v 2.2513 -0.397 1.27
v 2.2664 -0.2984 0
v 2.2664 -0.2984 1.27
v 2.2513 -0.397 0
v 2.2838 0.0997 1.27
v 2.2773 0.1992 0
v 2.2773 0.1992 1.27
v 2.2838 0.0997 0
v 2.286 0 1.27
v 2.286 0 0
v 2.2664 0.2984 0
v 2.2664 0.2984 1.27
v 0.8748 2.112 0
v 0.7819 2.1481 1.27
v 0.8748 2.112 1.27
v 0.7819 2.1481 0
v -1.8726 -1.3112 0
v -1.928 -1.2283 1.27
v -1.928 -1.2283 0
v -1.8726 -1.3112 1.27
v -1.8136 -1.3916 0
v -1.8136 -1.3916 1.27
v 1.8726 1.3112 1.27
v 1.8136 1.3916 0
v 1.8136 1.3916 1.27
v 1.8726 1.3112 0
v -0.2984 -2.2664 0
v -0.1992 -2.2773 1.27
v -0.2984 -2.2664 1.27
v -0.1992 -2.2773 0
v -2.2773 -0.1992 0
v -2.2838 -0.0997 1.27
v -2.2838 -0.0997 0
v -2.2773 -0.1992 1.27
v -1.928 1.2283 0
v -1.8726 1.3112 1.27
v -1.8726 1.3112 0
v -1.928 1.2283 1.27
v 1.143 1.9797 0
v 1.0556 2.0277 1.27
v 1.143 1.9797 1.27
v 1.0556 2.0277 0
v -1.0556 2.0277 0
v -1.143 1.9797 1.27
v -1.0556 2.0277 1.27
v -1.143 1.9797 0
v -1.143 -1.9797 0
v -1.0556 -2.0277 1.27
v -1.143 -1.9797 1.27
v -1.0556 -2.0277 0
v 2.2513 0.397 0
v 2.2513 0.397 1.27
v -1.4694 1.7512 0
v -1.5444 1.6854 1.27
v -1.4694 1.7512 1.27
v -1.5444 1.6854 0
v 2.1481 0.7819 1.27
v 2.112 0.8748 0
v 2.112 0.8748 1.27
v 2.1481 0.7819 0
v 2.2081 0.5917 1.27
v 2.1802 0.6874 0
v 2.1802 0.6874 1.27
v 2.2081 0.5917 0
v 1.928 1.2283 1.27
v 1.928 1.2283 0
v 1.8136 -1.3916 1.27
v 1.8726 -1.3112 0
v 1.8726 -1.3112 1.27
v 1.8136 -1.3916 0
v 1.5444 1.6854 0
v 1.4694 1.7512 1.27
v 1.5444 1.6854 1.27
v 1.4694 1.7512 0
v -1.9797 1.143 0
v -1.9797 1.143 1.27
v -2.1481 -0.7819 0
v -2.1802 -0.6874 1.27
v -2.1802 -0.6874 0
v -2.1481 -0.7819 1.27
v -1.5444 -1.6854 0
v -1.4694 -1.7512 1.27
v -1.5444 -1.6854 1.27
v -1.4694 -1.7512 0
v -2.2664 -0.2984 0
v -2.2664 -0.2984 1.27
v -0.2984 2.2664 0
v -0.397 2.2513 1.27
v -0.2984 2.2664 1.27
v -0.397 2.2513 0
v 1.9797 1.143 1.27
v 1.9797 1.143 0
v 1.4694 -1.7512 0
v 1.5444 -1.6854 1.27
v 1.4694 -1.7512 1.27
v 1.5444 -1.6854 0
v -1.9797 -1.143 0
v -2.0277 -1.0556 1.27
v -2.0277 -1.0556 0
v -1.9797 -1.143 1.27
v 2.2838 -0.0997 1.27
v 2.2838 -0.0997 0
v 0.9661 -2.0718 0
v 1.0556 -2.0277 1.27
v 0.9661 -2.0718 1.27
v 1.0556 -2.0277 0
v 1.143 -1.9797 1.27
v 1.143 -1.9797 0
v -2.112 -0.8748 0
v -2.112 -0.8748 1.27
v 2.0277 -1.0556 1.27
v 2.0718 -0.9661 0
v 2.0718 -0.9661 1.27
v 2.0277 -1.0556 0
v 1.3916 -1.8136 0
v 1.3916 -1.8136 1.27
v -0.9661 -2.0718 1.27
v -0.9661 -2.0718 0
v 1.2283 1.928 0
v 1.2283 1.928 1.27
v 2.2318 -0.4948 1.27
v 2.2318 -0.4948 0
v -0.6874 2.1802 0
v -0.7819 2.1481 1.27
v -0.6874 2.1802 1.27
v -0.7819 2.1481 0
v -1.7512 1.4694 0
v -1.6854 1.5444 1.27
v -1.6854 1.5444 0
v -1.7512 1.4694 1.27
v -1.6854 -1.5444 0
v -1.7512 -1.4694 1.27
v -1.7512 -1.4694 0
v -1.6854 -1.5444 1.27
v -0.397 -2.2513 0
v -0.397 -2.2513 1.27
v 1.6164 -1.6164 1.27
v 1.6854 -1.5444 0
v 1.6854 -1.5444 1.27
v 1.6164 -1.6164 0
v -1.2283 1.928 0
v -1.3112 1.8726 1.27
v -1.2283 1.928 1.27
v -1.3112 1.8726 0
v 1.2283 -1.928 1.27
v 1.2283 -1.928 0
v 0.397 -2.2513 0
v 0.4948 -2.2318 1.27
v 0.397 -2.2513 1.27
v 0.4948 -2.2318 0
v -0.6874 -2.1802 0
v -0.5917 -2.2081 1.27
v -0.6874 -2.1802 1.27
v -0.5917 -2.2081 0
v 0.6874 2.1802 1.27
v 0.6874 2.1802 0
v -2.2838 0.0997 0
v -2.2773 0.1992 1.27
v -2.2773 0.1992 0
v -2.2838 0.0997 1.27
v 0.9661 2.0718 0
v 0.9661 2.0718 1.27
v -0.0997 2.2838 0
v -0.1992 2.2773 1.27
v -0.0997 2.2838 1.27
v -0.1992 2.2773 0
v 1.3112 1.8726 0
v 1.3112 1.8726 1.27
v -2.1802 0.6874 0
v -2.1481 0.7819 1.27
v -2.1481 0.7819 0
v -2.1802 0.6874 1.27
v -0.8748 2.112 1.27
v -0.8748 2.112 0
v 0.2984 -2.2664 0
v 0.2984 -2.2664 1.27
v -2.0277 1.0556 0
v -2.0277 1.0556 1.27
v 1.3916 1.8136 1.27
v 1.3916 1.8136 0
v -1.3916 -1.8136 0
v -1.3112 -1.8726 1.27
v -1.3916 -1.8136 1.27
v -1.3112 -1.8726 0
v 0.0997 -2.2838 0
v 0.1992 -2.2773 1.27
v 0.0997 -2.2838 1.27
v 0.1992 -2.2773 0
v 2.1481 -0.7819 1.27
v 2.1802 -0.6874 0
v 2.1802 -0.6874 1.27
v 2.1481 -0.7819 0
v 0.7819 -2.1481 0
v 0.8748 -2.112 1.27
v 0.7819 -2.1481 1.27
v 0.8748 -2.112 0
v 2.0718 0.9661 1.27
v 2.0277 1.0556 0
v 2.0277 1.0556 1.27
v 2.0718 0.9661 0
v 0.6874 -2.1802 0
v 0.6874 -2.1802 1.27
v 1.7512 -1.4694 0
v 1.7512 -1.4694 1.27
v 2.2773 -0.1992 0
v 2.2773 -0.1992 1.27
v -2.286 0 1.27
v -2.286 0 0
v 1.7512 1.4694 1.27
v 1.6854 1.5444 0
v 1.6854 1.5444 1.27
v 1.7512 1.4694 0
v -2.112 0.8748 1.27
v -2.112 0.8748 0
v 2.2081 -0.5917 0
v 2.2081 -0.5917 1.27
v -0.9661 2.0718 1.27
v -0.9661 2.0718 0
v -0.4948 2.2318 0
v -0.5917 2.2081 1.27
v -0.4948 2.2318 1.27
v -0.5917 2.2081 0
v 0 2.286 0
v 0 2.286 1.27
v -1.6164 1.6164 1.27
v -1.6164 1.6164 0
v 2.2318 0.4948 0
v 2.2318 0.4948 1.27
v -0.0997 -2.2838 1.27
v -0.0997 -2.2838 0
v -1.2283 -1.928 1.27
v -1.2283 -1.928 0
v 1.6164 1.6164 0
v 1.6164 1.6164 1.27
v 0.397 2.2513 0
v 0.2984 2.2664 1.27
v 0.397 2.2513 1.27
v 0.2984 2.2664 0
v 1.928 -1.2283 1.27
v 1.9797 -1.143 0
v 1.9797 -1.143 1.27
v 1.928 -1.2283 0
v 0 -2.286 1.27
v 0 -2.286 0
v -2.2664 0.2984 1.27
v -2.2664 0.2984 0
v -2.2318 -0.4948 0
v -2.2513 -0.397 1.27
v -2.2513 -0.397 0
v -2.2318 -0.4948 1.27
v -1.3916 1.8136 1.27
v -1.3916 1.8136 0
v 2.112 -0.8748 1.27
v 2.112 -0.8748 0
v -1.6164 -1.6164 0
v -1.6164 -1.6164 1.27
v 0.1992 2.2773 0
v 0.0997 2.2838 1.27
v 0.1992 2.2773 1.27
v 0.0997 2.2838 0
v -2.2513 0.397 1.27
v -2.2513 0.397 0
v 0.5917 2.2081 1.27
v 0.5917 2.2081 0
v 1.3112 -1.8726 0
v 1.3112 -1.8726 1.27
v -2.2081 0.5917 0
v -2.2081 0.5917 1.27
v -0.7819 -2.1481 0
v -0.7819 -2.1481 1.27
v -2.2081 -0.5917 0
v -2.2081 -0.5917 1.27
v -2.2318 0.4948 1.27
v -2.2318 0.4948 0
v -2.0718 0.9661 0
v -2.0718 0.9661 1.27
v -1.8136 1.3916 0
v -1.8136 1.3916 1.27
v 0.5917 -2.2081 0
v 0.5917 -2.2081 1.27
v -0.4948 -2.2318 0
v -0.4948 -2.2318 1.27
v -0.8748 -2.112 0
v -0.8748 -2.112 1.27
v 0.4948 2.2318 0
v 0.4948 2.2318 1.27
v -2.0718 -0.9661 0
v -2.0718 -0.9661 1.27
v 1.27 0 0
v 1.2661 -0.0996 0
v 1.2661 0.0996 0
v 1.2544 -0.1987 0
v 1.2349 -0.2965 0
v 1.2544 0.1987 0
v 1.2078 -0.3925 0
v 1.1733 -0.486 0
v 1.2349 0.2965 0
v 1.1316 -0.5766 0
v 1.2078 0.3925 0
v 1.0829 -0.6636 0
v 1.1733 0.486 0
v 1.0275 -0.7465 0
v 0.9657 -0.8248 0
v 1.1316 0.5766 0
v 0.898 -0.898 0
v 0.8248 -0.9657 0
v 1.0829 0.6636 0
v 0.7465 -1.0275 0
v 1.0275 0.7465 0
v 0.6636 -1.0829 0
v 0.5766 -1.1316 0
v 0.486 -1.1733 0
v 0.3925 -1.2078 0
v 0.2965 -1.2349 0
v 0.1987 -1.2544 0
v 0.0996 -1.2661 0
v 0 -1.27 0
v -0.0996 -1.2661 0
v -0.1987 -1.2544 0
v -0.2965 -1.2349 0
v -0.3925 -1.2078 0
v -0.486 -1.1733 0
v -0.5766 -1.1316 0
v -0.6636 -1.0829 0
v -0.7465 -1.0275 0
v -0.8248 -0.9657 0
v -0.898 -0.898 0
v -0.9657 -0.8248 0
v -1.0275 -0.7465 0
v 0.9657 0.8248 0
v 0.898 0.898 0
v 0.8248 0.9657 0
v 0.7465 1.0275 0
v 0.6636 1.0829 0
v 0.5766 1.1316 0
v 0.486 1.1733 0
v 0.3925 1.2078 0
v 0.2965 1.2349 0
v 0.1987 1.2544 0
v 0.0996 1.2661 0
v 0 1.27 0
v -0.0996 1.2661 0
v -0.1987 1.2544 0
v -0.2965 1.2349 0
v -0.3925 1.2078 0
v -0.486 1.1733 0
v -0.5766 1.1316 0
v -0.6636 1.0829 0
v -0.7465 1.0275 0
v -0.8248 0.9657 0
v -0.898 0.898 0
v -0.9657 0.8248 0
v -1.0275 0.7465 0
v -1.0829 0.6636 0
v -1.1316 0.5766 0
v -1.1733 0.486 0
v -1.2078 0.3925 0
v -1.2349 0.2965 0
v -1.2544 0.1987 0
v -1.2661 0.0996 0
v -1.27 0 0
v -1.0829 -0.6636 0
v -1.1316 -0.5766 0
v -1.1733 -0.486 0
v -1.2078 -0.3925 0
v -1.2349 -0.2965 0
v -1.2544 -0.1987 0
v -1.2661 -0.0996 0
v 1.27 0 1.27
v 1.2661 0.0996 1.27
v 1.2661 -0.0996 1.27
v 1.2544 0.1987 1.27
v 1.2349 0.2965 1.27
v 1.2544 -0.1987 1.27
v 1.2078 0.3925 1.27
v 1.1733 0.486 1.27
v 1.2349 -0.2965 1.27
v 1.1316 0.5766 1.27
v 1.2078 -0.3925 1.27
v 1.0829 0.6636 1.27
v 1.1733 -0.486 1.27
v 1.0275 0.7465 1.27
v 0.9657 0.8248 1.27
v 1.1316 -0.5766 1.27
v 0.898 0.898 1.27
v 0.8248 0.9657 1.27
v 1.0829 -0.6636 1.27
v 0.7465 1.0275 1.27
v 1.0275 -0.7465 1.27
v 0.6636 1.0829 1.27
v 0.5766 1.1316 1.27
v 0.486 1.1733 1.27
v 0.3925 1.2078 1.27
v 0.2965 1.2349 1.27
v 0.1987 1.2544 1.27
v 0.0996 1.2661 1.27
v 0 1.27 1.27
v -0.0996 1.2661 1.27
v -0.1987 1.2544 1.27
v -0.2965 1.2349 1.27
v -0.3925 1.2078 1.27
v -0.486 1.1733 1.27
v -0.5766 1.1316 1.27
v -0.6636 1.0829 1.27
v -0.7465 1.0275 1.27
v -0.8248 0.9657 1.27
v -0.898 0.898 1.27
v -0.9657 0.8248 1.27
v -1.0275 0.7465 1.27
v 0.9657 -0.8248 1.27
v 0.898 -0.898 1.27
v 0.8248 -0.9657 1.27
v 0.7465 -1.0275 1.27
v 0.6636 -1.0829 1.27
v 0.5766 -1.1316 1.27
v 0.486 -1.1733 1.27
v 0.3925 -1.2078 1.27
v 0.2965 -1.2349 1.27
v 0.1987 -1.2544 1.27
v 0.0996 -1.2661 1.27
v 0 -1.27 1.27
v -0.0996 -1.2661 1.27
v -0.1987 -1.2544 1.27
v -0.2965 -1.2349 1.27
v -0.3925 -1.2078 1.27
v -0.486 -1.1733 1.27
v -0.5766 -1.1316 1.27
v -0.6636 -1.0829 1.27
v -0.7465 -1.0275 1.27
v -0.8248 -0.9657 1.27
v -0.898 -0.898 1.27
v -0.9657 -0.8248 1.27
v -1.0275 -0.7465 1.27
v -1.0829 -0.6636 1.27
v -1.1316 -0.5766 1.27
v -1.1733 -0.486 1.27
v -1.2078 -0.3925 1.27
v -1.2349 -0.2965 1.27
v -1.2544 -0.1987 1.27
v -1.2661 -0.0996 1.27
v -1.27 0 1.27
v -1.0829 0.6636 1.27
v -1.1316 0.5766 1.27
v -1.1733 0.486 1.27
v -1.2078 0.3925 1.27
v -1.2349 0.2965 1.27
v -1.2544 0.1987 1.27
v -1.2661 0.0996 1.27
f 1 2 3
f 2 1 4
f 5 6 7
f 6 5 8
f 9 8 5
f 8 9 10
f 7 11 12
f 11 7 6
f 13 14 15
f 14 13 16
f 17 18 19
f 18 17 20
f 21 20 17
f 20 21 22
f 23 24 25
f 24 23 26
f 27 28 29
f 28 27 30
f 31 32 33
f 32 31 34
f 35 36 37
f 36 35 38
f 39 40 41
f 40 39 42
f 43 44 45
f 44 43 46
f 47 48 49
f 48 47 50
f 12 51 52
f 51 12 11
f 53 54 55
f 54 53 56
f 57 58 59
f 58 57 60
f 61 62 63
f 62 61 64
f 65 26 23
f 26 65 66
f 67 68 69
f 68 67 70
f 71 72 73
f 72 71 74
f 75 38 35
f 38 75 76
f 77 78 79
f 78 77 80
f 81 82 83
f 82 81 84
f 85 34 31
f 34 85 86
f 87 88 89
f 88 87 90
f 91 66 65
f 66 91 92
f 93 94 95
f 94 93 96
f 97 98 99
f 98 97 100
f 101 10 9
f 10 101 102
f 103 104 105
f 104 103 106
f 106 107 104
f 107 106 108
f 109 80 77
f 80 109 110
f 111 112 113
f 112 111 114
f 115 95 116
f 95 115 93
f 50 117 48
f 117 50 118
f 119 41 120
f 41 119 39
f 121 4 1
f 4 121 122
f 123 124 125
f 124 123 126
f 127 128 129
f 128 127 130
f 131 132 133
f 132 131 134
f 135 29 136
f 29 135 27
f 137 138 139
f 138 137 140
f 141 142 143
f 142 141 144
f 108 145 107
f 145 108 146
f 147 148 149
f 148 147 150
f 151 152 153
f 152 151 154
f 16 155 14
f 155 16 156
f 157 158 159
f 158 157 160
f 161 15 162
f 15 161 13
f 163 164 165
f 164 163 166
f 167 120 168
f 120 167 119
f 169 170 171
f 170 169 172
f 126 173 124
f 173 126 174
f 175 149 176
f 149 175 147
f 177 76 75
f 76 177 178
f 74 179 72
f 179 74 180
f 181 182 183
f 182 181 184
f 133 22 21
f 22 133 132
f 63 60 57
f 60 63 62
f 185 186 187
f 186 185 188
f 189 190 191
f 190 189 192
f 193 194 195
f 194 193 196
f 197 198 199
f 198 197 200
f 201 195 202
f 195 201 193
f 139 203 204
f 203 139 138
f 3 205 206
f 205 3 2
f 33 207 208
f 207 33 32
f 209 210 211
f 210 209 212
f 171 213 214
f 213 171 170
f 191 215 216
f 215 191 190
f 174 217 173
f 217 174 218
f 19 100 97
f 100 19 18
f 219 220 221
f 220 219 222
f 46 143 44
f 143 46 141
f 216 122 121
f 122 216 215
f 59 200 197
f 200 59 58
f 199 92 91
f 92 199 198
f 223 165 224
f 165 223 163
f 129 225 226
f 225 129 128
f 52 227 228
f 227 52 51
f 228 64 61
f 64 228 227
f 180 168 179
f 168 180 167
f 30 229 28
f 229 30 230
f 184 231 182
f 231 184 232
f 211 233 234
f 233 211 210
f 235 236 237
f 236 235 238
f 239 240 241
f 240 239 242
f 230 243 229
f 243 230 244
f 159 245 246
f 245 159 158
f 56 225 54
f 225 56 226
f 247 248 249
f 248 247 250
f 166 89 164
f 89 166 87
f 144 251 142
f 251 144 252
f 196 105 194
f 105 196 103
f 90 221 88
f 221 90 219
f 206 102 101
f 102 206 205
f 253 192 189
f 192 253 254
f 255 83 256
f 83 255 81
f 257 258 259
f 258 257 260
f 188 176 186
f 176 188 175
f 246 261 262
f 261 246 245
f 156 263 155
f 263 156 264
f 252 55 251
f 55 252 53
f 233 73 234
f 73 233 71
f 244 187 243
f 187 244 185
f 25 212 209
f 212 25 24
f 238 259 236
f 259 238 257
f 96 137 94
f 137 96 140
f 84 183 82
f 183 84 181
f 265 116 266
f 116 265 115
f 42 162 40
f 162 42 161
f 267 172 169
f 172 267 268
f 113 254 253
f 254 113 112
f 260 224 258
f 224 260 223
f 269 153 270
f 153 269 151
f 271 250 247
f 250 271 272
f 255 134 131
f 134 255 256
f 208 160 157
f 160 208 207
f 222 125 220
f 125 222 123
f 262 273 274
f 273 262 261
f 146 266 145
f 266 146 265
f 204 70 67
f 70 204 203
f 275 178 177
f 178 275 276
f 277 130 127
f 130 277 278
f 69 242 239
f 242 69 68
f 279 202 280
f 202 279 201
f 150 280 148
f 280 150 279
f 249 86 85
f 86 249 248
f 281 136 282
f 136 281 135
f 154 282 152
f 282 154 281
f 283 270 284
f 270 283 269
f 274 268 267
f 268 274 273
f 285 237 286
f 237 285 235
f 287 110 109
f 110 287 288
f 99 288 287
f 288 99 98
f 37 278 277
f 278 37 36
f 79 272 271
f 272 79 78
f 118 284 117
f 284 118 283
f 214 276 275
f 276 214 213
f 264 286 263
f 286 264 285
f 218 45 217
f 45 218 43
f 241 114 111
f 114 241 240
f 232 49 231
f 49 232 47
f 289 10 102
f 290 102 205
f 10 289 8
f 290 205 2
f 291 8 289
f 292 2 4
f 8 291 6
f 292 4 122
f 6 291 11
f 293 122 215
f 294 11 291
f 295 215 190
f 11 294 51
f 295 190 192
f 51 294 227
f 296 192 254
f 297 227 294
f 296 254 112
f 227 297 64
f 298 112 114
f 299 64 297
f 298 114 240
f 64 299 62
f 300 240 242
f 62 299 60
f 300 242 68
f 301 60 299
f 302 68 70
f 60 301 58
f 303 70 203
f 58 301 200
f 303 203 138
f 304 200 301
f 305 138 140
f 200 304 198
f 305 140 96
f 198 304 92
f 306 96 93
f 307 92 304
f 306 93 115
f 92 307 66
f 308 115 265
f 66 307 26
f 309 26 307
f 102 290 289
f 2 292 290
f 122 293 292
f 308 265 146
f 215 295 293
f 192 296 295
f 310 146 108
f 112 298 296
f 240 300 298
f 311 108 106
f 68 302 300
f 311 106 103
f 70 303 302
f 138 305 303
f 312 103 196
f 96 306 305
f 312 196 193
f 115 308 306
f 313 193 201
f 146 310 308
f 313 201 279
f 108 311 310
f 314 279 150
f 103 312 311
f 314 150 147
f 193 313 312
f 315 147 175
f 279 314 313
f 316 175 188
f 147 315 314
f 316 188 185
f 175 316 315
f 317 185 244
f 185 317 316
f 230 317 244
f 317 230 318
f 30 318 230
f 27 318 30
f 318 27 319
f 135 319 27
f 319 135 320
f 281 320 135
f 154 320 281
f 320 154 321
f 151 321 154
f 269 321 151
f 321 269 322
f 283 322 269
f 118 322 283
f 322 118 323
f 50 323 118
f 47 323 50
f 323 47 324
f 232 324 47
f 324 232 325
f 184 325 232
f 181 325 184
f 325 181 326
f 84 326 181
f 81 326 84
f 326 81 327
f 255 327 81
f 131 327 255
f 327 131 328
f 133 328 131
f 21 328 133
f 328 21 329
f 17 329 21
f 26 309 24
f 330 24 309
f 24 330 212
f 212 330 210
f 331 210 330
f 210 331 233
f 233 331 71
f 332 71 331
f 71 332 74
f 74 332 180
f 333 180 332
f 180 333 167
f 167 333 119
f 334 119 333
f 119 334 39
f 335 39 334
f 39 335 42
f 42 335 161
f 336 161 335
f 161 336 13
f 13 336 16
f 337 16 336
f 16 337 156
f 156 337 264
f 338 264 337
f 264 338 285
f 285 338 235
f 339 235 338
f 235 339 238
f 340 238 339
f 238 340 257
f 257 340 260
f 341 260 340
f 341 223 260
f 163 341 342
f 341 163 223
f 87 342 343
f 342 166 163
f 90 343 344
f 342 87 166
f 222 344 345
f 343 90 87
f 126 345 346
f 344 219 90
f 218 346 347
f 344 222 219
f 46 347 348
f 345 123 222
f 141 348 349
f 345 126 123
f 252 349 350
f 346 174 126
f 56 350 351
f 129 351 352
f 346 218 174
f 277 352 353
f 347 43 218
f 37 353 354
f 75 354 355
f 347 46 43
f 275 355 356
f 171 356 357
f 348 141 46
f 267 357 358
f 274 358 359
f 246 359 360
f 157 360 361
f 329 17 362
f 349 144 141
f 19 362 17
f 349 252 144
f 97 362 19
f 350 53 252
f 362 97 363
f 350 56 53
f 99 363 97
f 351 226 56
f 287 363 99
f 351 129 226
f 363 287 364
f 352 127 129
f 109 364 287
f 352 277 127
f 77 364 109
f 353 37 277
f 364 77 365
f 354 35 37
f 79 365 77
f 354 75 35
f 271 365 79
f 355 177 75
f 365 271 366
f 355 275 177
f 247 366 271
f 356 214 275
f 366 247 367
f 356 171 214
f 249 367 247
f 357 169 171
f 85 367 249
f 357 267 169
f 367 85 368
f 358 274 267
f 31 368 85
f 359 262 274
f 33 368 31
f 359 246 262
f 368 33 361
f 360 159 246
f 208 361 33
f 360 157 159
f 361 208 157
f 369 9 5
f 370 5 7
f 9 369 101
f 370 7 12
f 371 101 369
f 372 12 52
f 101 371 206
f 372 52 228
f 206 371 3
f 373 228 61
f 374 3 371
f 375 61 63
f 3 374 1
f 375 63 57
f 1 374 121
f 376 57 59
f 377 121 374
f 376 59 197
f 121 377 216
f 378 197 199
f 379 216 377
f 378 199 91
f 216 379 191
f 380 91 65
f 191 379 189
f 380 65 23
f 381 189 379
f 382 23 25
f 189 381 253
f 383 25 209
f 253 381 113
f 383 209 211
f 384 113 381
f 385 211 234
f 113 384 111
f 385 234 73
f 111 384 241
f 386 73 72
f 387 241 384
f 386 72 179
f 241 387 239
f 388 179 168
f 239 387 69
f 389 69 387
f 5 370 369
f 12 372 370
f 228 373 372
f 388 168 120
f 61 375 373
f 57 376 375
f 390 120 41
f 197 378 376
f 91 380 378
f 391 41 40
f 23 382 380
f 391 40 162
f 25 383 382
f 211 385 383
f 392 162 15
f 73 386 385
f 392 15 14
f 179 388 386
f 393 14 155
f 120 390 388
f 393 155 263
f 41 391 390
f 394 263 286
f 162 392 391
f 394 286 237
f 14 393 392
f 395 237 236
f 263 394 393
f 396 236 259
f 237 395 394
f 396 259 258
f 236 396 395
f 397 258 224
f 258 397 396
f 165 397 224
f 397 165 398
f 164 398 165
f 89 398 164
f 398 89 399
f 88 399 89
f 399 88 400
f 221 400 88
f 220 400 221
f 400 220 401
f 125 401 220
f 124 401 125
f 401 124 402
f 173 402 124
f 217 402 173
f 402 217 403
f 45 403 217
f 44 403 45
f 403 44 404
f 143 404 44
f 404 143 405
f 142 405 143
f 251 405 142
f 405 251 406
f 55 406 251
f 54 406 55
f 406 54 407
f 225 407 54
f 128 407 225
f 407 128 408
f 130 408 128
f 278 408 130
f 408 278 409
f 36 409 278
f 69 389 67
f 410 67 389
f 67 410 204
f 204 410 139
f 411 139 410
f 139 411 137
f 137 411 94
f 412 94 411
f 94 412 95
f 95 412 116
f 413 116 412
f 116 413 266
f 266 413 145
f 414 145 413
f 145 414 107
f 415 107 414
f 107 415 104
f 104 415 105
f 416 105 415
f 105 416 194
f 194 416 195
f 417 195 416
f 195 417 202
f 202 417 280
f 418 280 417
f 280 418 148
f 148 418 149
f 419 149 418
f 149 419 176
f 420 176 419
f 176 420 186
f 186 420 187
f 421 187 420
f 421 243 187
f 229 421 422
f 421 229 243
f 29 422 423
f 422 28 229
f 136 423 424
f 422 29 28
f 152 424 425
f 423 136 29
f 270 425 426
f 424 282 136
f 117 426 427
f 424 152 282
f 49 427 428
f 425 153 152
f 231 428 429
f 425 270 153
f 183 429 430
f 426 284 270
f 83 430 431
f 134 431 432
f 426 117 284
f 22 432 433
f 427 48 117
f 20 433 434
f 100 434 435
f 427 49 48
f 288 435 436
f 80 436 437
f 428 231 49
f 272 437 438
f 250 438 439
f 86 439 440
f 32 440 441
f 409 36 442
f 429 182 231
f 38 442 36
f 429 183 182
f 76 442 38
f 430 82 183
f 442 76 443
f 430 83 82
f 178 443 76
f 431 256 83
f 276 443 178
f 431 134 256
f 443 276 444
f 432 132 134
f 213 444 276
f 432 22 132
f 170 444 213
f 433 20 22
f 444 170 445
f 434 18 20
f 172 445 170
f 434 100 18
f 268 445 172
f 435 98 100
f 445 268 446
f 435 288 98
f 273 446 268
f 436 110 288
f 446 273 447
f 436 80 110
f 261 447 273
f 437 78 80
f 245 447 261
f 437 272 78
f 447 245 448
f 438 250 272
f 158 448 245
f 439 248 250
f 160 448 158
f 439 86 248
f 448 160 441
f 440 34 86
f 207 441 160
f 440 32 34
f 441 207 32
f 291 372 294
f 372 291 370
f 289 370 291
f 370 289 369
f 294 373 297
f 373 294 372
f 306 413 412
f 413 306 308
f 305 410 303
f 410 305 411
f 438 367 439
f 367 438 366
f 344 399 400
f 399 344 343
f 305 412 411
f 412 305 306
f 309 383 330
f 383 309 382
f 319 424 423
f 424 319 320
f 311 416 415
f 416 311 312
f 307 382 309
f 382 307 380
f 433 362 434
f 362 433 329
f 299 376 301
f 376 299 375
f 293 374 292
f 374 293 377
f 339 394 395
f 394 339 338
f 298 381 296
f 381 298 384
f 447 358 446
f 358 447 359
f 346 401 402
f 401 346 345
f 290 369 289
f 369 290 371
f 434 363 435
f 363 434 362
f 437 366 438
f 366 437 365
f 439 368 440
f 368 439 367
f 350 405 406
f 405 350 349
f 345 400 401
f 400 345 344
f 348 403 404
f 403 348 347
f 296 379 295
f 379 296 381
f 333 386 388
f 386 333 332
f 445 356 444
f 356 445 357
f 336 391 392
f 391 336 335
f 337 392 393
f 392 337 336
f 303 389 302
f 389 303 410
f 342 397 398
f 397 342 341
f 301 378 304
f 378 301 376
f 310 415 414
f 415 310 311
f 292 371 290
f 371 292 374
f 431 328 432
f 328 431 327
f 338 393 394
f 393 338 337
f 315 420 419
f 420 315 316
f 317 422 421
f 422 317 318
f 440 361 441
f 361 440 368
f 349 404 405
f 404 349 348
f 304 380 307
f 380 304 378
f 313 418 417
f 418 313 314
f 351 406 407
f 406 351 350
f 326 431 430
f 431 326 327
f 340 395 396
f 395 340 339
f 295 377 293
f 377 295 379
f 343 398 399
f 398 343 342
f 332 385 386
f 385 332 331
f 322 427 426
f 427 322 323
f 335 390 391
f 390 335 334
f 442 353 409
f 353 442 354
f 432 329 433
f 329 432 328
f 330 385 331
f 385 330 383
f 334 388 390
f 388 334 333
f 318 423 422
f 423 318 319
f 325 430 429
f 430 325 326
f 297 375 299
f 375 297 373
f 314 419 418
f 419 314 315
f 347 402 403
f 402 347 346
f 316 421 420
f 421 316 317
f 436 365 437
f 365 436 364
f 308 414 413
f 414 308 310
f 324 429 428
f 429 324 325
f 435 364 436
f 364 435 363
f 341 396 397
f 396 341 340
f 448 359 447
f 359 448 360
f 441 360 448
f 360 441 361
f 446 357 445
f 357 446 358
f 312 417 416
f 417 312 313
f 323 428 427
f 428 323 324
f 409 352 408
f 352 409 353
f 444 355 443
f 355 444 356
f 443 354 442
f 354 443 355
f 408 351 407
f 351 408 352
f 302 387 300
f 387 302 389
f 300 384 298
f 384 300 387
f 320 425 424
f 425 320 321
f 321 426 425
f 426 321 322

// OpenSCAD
// file: ../lib/common.scad
// Shared helpers for the AR turntable part models.
//
// Every part file holds a parameter table P. Each row is:
//   [id, description, value_mm, evidence, display_unit, source_or_how_to_check]
//
// Evidence codes:
//   F  factory document          O  owner report
//   C  community drawing         S  industry standard
//   D  design choice             M  measured for this repository
//   DV derived from cited sources, not yet verified on a part. The source
//      column holds the derivation: the formula, each input with its source,
//      and how to verify. Drawn in blue. Needs a row in TO-CONFIRM.md whose
//      value starts with "Derived:". Change to M once measured.
//   PH placeholder: chosen only so the model has a shape. It is NOT a
//      measurement. Drawn in red. Replace it, and change the code, once it
//      is measured.
//
// Every part file also emits metadata naming the part page, the part, the
// version, the material and the tables it fits, each fit with its evidence:
//   ["part", "parts/counterweight.md"], ["part_name", "Counterweight"],
//   ["version", "XA brass weight, 1961 to 1979"], ["material", "Brass"],
//   ["fits", [["XA", "Fitted by AR", "XA service manual p. 4"], ["XB", "Unconfirmed", ""]]]
// The fit word is one of: Fitted by AR, Fits, Fits with a change, Does not
// fit, Unconfirmed. build.py prints these in the title block and writes the
// drawings table of cad/README.md from them.
// License: CC BY-SA 4.0. See LICENSE at the repository root.

IN = 25.4;      // one inch, in mm. All model geometry is in mm.
EPS = 0.01;     // overlap so boolean cuts do not leave zero-thickness skins
$fa = 2;
$fs = 0.1;

// Value of parameter `id` in table t.
function pv(t, id) = t[search([id], t)[0]][2];

// Print part data for cad/tools/build.py, which reads it from the console.
module emit(meta, params, dims = []) {
    echo(META = meta);
    for (row = params) echo(PARAM = row);
    for (row = dims) echo(DIM = row);
}

// Rounded rectangle prism: centered in XY, from z = 0 to z = h.
module rr_prism(l, w, h, r) {
    translate([-l / 2 + r, -w / 2, 0]) cube([l - 2 * r, w, h]);
    translate([-l / 2, -w / 2 + r, 0]) cube([l, w - 2 * r, h]);
    for (sx = [-1, 1], sy = [-1, 1])
        translate([sx * (l / 2 - r), sy * (w / 2 - r), 0]) cylinder(r = r, h = h);
}

// Slot along X: `c` is the distance between end-radius centers.
module slot_prism(c, w, h) {
    translate([-c / 2, -w / 2, 0]) cube([c, w, h]);
    for (sx = [-1, 1]) translate([sx * c / 2, 0, 0]) cylinder(d = w, h = h);
}
// main file
// XA/XB cartridge standoff bushing, sizes #1 to #3.
// All dimensions are from the RDW hardware drawing, December 7, 2023:
// docs/originals/ar-headshell-hardware-rev-1.pdf
// License: CC BY-SA 4.0. See LICENSE at the repository root.
include <../lib/common.scad>

variant = 1;   // 1, 2, or 3
flat = false;

heights = [0.050, 0.100, 0.150];

P = [
    ["BU1", "Inside diameter", 0.100 * IN, "C", "in", "RDW hardware drawing"],
    ["BU2", "Outside diameter", 0.180 * IN, "C", "in", "RDW hardware drawing"],
    ["BU3", "Height for this size", heights[variant - 1] * IN, "C", "in", "RDW hardware drawing: 0.050, 0.100, 0.150 in"],
];

id_ = pv(P, "BU1");
od = pv(P, "BU2");
h = pv(P, "BU3");

module part() {
    difference() {
        cylinder(d = od, h = h);
        translate([0, 0, -1]) cylinder(d = id_, h = h + 2);
    }
}

emit(
    [
        ["id", "standoff-bushing-xa-xb-plastic"],
        ["title", "Cartridge standoff bushing, XA and XB"],
        ["status", "GEOMETRY COMPLETE"],
        ["part", "parts/cartridge-hardware.md"],
        ["part_name", "Cartridge screws, bushings and shims"],
        ["version", "XA and XB hardware set, heights #1 to #3"],
        ["scope", "Original-style XA/XB hardware set. Community drawing, not an AR factory drawing"],
        ["material", "Soft plastic, grade not established"],
        ["density", 1.1],
        ["fits", [["XA", "Fitted by AR", "sheet L-1591 lists three bushing sizes; dimensions from the community drawing of XA and XB sets"],
                  ["XB", "Fitted by AR", "same two sources"], ["AR77XB", "Unconfirmed", ""]]],
        ["make", "Turn or cut from tube. 2 of each size per set"],
        ["variants", [[1, "#1, 0.050 in"], [2, "#2, 0.100 in"], [3, "#3, 0.150 in"]]],
        ["views", ["front", "top", "right", "iso"]],
        ["sections", [["A", "y", 0]]],
        ["notes", [
            "AR sheet L-1591: bushings turn onto the screws, which hold them in place. ID 0.100 in against a #3 screw is a close fit.",
            "Only the bushing set for a given cartridge is used. See the selection table on L-1591.",
        ]],
    ],
    P,
    [
        ["front", "h", [-od / 2, 0, 0], [od / 2, 0, 0], -9, "BU2", "Ø"],
        ["front", "v", [od / 2, 0, 0], [od / 2, 0, h], 9, "BU3"],
        ["front", "cl", [0, 0, -0.2], [0, 0, h + 0.2]],
        ["top", "d", [0, 0, 0], id_ / 2, 9, "BU1", "Ø", 50],
    ]
);

if (flat) projection() part(); else part();
